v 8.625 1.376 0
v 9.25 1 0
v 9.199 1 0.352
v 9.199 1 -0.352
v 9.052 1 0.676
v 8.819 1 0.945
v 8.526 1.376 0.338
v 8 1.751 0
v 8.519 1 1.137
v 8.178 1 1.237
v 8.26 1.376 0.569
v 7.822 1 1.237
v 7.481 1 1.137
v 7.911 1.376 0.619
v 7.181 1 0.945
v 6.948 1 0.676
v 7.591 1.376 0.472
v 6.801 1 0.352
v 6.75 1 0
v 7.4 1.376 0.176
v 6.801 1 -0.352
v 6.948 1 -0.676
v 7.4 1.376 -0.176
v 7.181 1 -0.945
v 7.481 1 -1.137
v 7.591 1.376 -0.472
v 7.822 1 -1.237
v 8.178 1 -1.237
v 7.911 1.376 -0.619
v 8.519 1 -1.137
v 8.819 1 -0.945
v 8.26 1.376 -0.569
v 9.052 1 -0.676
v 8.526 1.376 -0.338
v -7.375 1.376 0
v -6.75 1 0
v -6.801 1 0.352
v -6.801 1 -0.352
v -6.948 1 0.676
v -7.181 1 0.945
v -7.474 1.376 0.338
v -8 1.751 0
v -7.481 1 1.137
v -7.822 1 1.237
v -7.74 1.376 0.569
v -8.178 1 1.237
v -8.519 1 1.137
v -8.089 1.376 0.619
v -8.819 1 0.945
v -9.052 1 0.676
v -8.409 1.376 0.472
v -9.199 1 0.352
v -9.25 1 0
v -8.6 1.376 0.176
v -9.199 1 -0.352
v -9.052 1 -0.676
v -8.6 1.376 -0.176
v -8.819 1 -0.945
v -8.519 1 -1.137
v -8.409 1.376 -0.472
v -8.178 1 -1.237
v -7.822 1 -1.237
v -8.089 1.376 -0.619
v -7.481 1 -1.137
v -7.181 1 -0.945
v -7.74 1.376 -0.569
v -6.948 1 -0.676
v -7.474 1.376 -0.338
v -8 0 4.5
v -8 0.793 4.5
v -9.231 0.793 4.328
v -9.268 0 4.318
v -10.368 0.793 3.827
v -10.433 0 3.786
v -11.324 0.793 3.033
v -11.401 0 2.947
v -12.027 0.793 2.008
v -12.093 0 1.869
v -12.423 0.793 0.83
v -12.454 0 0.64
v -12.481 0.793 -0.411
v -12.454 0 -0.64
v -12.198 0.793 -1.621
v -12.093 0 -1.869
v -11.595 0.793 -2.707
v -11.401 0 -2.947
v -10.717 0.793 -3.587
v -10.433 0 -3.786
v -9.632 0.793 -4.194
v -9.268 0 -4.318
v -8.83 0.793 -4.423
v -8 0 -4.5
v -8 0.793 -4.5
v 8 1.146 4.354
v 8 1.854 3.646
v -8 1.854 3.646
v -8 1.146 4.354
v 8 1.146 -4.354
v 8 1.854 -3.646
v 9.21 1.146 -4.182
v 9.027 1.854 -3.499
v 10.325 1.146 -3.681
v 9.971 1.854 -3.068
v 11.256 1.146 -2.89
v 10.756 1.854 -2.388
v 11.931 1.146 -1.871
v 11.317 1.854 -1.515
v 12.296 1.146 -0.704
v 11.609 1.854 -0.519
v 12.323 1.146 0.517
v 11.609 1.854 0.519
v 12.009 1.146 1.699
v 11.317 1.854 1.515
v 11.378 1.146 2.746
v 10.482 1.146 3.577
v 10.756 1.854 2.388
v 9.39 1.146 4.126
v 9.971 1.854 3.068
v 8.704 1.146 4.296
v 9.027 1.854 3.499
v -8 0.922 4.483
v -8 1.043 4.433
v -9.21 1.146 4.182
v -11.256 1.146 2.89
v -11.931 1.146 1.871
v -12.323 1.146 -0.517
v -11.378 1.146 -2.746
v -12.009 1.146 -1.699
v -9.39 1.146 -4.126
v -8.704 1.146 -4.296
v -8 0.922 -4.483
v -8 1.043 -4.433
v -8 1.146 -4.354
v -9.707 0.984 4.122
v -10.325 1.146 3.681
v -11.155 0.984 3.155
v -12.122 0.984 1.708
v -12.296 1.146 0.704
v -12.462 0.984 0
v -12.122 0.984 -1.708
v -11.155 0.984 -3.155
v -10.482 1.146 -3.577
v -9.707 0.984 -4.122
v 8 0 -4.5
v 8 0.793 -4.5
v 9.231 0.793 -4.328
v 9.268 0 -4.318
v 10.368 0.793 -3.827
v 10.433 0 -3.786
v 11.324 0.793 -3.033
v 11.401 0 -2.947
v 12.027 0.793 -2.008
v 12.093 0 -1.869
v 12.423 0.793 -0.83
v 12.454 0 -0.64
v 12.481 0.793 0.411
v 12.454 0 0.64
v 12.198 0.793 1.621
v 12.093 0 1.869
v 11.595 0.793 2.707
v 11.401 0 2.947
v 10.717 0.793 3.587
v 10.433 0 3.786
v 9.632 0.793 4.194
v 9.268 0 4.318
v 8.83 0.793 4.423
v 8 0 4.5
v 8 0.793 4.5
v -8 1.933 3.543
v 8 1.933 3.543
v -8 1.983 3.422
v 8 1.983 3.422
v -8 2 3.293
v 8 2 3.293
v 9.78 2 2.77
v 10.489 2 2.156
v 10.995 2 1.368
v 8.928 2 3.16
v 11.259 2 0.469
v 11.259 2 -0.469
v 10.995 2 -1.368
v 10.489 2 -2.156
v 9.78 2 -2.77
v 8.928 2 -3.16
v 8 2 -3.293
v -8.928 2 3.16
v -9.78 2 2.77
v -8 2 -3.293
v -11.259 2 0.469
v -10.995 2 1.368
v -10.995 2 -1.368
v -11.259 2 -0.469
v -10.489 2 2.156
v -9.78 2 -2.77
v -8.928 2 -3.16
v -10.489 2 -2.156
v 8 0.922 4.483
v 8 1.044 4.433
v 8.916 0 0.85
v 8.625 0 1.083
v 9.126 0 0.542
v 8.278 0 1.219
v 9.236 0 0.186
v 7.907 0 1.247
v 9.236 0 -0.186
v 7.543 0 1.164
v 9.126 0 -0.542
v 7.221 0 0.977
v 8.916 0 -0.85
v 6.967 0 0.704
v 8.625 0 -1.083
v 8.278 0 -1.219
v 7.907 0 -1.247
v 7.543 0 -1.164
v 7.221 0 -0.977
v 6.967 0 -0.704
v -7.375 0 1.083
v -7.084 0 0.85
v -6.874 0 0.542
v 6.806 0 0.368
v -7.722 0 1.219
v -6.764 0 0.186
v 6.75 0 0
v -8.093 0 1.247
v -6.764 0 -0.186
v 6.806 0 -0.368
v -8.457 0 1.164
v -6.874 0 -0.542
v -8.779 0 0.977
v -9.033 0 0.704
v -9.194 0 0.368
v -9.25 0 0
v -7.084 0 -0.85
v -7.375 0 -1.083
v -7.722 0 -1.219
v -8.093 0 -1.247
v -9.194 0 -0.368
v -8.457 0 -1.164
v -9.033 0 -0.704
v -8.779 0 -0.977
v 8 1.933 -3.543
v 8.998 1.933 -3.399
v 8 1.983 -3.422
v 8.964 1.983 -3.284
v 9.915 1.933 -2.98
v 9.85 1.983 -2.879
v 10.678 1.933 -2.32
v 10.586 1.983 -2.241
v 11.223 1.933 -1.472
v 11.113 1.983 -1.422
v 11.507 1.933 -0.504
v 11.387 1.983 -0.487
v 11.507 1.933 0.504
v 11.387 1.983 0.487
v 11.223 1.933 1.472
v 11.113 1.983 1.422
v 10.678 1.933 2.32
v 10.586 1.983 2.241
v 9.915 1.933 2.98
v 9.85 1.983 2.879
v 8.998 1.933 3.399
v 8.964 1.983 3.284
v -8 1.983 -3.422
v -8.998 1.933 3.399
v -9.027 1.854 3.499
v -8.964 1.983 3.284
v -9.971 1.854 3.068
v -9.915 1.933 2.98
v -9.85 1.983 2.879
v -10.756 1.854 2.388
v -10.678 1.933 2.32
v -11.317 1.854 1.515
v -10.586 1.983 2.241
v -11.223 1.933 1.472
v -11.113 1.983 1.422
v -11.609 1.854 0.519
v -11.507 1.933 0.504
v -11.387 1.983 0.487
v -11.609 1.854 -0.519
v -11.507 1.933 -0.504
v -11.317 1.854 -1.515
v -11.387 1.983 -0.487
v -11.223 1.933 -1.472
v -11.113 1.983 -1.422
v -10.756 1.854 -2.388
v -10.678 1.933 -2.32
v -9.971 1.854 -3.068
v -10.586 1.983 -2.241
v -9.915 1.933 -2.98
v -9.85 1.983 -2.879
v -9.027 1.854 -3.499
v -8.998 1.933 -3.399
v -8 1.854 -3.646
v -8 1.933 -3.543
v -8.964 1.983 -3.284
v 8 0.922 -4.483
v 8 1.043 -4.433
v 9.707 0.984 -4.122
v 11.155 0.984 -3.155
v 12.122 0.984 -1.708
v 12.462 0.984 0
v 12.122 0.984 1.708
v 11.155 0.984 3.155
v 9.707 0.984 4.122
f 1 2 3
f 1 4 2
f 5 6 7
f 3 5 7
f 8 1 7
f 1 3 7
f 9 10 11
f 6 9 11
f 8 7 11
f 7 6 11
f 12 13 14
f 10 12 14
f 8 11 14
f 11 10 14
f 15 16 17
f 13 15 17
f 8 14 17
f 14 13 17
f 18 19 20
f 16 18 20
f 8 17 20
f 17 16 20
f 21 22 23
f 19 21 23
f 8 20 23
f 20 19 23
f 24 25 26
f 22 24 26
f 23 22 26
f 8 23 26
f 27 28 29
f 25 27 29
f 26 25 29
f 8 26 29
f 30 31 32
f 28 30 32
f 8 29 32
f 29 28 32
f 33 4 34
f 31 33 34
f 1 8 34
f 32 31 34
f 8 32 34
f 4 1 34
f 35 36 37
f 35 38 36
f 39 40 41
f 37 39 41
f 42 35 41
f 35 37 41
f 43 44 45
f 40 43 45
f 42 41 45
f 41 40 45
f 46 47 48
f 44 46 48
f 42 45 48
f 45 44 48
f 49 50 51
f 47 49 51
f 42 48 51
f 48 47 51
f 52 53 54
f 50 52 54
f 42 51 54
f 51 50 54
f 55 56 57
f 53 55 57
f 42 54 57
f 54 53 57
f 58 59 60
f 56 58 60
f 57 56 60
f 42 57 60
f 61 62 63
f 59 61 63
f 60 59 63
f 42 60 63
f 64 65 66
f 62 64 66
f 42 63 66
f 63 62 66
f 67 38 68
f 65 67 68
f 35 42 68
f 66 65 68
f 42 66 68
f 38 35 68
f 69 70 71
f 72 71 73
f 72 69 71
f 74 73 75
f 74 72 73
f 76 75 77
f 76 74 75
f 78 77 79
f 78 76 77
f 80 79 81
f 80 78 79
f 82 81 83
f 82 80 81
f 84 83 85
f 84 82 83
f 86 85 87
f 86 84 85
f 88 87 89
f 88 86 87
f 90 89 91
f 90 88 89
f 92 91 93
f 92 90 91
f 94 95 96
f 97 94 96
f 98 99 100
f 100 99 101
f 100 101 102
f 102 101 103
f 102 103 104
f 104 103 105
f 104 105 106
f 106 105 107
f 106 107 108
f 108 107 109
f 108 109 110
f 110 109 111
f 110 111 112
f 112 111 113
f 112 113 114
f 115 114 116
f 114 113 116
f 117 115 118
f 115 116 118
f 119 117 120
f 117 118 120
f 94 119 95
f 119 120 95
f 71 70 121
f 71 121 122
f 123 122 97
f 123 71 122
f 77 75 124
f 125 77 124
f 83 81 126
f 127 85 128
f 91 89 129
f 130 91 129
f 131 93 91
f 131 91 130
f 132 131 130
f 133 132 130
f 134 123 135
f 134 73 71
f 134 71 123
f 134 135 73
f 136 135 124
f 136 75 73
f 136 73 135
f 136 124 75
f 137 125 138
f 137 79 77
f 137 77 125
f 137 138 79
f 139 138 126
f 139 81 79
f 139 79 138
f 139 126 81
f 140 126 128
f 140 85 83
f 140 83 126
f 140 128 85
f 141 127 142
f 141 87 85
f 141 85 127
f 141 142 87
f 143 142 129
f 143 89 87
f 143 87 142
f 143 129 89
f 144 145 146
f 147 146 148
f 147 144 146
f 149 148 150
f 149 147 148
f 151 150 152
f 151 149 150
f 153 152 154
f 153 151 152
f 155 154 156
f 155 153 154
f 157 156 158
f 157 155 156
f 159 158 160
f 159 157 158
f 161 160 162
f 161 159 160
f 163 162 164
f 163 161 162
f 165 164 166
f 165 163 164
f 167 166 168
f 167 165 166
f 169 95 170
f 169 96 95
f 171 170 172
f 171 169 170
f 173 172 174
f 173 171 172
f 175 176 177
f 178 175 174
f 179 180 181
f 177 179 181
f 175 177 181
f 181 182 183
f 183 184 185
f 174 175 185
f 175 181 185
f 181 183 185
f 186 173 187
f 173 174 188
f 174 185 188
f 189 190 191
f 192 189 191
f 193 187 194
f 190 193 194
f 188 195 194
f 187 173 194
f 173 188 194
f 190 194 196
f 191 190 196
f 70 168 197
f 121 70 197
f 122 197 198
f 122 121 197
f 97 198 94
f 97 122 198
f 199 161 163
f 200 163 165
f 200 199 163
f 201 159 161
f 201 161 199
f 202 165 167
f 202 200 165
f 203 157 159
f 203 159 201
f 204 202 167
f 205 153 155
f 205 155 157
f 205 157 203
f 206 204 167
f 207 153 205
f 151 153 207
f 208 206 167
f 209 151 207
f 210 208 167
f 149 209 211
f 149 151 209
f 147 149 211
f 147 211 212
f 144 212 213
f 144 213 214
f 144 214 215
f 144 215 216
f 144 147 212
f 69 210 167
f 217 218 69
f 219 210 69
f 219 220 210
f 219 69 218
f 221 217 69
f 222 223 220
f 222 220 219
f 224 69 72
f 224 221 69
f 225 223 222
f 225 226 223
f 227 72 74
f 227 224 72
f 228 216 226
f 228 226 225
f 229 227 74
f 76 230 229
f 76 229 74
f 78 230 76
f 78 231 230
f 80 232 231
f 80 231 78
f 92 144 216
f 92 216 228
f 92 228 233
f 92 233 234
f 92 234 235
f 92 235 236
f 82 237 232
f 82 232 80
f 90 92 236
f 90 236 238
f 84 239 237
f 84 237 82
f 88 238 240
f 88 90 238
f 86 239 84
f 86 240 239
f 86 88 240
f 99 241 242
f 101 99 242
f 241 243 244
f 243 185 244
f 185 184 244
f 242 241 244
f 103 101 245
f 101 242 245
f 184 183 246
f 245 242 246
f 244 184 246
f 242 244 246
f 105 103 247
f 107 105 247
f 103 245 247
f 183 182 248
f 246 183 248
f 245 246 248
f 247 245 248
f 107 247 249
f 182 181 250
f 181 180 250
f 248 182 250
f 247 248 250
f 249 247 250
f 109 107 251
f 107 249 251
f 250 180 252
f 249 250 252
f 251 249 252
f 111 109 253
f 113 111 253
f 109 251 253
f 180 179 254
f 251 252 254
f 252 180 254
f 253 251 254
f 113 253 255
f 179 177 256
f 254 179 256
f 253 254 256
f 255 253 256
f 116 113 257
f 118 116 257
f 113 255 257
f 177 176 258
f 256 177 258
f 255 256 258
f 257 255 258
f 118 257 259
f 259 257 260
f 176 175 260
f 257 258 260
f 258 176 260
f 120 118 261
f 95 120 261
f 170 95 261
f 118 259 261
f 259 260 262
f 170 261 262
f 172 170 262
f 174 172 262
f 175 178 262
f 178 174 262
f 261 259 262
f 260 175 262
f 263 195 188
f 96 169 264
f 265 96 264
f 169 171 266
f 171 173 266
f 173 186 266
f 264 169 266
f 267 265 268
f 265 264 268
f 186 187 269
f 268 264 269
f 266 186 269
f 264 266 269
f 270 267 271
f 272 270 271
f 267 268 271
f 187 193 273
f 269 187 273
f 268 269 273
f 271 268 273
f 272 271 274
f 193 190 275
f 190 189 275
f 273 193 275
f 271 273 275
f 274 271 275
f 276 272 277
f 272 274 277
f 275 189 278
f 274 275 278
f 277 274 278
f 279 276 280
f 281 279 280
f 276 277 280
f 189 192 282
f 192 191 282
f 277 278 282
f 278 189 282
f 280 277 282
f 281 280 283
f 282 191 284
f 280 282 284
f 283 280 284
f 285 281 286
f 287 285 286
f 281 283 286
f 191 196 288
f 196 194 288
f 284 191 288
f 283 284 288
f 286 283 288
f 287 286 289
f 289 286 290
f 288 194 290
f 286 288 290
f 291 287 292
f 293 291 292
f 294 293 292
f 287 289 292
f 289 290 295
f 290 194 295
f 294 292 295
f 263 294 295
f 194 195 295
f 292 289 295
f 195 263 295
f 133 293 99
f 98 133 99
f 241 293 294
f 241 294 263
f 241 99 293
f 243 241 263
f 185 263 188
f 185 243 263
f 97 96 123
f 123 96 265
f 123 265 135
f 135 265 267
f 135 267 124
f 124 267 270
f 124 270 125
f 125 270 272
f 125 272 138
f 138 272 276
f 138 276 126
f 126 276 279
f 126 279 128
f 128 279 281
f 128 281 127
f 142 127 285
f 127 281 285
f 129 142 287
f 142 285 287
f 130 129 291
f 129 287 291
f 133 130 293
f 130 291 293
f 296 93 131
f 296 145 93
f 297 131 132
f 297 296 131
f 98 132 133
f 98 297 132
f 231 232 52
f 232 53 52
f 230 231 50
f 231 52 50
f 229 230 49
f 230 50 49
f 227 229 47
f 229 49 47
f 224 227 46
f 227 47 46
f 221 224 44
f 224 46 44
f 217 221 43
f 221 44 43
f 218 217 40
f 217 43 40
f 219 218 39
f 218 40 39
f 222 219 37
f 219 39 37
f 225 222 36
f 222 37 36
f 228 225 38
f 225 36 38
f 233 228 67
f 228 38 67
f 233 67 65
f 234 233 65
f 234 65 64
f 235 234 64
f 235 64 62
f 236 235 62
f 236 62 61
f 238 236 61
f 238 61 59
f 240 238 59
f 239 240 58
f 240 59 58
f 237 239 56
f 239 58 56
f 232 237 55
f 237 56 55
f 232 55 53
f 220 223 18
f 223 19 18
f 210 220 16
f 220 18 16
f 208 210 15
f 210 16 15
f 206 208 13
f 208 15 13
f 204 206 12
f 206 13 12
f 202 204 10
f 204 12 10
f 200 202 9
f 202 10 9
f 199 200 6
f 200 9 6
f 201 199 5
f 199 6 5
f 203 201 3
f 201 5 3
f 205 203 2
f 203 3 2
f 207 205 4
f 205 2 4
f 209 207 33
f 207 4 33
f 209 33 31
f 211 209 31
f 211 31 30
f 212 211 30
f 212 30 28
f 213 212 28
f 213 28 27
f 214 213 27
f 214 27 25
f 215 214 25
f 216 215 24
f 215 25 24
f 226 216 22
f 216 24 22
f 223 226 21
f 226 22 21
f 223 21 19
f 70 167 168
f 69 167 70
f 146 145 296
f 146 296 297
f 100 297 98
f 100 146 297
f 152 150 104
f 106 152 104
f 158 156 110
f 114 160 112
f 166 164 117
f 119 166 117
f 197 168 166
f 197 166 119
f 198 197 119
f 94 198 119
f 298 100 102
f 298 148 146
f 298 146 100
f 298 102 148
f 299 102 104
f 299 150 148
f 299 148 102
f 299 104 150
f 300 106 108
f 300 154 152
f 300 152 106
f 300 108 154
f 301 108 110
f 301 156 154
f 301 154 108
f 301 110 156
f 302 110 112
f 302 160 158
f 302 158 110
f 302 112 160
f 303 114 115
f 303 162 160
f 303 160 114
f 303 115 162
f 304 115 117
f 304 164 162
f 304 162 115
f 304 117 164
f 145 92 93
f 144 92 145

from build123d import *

# Parameters (mm, degrees)
BOSS_EXTRUDE1_DEPTH             = 2
TAP_DRILL_FOR_M3X0_5_TAP1_D     = 2.5
TAP_DRILL_FOR_M3X0_5_TAP1_DEPTH = 1
TAP_DRILL_FOR_M3X0_5_TAP1_TIP   = 0.751075774
CHAMFER3_SIZE                   = 1
FILLET1_R                       = 0.5


with BuildPart() as part:
    # Sketch1 → Boss-Extrude1 (new body)
    with BuildSketch(Plane(origin=(0, 0, 0), x_dir=(1, 0, 0), z_dir=(0, 1, 0))):
        with BuildLine():
            Line((8, -4.5), (-8, -4.5))
            ThreePointArc((-8, -4.5), (-12.5, 0), (-8, 4.5))
            Line((-8, 4.5), (8, 4.5))
            ThreePointArc((8, 4.5), (12.5, 0), (8, -4.5))
        make_face()
    extrude(amount=BOSS_EXTRUDE1_DEPTH)

    # Tap Drill for M3x0.5 Tap1
    with Locations(Plane.XZ):
        with Locations((-8, 0), (8, 0)):
            Hole(TAP_DRILL_FOR_M3X0_5_TAP1_D / 2, depth=TAP_DRILL_FOR_M3X0_5_TAP1_DEPTH)
            with Locations((0, 0, -(TAP_DRILL_FOR_M3X0_5_TAP1_DEPTH + TAP_DRILL_FOR_M3X0_5_TAP1_TIP / 2))):  # 118° drill point
                Cone(0, TAP_DRILL_FOR_M3X0_5_TAP1_D / 2, TAP_DRILL_FOR_M3X0_5_TAP1_TIP, mode=Mode.SUBTRACT)

    # Chamfer3
    chamfer3_edges = [part.edges().sort_by_distance(p)[0] for p in [
        (12.5, 2, 0),
        (0, 2, -4.5),
        (-12.5, 2, 0),
        (0, 2, 4.5),
    ]]
    chamfer(chamfer3_edges, length=CHAMFER3_SIZE)

    # Fillet1
    fillet1_edges = [part.edges().sort_by_distance(p)[0] for p in [
        (0, 2, 3.5),
        (11.5, 2, 0),
        (-11.5, 2, 0),
        (0, 2, -3.5),
        (0, 1, -4.5),
        (-12.5, 1, 0),
        (12.5, 1, 0),
        (0, 1, 4.5),
    ]]
    fillet(fillet1_edges, radius=FILLET1_R)


solid = part.part
